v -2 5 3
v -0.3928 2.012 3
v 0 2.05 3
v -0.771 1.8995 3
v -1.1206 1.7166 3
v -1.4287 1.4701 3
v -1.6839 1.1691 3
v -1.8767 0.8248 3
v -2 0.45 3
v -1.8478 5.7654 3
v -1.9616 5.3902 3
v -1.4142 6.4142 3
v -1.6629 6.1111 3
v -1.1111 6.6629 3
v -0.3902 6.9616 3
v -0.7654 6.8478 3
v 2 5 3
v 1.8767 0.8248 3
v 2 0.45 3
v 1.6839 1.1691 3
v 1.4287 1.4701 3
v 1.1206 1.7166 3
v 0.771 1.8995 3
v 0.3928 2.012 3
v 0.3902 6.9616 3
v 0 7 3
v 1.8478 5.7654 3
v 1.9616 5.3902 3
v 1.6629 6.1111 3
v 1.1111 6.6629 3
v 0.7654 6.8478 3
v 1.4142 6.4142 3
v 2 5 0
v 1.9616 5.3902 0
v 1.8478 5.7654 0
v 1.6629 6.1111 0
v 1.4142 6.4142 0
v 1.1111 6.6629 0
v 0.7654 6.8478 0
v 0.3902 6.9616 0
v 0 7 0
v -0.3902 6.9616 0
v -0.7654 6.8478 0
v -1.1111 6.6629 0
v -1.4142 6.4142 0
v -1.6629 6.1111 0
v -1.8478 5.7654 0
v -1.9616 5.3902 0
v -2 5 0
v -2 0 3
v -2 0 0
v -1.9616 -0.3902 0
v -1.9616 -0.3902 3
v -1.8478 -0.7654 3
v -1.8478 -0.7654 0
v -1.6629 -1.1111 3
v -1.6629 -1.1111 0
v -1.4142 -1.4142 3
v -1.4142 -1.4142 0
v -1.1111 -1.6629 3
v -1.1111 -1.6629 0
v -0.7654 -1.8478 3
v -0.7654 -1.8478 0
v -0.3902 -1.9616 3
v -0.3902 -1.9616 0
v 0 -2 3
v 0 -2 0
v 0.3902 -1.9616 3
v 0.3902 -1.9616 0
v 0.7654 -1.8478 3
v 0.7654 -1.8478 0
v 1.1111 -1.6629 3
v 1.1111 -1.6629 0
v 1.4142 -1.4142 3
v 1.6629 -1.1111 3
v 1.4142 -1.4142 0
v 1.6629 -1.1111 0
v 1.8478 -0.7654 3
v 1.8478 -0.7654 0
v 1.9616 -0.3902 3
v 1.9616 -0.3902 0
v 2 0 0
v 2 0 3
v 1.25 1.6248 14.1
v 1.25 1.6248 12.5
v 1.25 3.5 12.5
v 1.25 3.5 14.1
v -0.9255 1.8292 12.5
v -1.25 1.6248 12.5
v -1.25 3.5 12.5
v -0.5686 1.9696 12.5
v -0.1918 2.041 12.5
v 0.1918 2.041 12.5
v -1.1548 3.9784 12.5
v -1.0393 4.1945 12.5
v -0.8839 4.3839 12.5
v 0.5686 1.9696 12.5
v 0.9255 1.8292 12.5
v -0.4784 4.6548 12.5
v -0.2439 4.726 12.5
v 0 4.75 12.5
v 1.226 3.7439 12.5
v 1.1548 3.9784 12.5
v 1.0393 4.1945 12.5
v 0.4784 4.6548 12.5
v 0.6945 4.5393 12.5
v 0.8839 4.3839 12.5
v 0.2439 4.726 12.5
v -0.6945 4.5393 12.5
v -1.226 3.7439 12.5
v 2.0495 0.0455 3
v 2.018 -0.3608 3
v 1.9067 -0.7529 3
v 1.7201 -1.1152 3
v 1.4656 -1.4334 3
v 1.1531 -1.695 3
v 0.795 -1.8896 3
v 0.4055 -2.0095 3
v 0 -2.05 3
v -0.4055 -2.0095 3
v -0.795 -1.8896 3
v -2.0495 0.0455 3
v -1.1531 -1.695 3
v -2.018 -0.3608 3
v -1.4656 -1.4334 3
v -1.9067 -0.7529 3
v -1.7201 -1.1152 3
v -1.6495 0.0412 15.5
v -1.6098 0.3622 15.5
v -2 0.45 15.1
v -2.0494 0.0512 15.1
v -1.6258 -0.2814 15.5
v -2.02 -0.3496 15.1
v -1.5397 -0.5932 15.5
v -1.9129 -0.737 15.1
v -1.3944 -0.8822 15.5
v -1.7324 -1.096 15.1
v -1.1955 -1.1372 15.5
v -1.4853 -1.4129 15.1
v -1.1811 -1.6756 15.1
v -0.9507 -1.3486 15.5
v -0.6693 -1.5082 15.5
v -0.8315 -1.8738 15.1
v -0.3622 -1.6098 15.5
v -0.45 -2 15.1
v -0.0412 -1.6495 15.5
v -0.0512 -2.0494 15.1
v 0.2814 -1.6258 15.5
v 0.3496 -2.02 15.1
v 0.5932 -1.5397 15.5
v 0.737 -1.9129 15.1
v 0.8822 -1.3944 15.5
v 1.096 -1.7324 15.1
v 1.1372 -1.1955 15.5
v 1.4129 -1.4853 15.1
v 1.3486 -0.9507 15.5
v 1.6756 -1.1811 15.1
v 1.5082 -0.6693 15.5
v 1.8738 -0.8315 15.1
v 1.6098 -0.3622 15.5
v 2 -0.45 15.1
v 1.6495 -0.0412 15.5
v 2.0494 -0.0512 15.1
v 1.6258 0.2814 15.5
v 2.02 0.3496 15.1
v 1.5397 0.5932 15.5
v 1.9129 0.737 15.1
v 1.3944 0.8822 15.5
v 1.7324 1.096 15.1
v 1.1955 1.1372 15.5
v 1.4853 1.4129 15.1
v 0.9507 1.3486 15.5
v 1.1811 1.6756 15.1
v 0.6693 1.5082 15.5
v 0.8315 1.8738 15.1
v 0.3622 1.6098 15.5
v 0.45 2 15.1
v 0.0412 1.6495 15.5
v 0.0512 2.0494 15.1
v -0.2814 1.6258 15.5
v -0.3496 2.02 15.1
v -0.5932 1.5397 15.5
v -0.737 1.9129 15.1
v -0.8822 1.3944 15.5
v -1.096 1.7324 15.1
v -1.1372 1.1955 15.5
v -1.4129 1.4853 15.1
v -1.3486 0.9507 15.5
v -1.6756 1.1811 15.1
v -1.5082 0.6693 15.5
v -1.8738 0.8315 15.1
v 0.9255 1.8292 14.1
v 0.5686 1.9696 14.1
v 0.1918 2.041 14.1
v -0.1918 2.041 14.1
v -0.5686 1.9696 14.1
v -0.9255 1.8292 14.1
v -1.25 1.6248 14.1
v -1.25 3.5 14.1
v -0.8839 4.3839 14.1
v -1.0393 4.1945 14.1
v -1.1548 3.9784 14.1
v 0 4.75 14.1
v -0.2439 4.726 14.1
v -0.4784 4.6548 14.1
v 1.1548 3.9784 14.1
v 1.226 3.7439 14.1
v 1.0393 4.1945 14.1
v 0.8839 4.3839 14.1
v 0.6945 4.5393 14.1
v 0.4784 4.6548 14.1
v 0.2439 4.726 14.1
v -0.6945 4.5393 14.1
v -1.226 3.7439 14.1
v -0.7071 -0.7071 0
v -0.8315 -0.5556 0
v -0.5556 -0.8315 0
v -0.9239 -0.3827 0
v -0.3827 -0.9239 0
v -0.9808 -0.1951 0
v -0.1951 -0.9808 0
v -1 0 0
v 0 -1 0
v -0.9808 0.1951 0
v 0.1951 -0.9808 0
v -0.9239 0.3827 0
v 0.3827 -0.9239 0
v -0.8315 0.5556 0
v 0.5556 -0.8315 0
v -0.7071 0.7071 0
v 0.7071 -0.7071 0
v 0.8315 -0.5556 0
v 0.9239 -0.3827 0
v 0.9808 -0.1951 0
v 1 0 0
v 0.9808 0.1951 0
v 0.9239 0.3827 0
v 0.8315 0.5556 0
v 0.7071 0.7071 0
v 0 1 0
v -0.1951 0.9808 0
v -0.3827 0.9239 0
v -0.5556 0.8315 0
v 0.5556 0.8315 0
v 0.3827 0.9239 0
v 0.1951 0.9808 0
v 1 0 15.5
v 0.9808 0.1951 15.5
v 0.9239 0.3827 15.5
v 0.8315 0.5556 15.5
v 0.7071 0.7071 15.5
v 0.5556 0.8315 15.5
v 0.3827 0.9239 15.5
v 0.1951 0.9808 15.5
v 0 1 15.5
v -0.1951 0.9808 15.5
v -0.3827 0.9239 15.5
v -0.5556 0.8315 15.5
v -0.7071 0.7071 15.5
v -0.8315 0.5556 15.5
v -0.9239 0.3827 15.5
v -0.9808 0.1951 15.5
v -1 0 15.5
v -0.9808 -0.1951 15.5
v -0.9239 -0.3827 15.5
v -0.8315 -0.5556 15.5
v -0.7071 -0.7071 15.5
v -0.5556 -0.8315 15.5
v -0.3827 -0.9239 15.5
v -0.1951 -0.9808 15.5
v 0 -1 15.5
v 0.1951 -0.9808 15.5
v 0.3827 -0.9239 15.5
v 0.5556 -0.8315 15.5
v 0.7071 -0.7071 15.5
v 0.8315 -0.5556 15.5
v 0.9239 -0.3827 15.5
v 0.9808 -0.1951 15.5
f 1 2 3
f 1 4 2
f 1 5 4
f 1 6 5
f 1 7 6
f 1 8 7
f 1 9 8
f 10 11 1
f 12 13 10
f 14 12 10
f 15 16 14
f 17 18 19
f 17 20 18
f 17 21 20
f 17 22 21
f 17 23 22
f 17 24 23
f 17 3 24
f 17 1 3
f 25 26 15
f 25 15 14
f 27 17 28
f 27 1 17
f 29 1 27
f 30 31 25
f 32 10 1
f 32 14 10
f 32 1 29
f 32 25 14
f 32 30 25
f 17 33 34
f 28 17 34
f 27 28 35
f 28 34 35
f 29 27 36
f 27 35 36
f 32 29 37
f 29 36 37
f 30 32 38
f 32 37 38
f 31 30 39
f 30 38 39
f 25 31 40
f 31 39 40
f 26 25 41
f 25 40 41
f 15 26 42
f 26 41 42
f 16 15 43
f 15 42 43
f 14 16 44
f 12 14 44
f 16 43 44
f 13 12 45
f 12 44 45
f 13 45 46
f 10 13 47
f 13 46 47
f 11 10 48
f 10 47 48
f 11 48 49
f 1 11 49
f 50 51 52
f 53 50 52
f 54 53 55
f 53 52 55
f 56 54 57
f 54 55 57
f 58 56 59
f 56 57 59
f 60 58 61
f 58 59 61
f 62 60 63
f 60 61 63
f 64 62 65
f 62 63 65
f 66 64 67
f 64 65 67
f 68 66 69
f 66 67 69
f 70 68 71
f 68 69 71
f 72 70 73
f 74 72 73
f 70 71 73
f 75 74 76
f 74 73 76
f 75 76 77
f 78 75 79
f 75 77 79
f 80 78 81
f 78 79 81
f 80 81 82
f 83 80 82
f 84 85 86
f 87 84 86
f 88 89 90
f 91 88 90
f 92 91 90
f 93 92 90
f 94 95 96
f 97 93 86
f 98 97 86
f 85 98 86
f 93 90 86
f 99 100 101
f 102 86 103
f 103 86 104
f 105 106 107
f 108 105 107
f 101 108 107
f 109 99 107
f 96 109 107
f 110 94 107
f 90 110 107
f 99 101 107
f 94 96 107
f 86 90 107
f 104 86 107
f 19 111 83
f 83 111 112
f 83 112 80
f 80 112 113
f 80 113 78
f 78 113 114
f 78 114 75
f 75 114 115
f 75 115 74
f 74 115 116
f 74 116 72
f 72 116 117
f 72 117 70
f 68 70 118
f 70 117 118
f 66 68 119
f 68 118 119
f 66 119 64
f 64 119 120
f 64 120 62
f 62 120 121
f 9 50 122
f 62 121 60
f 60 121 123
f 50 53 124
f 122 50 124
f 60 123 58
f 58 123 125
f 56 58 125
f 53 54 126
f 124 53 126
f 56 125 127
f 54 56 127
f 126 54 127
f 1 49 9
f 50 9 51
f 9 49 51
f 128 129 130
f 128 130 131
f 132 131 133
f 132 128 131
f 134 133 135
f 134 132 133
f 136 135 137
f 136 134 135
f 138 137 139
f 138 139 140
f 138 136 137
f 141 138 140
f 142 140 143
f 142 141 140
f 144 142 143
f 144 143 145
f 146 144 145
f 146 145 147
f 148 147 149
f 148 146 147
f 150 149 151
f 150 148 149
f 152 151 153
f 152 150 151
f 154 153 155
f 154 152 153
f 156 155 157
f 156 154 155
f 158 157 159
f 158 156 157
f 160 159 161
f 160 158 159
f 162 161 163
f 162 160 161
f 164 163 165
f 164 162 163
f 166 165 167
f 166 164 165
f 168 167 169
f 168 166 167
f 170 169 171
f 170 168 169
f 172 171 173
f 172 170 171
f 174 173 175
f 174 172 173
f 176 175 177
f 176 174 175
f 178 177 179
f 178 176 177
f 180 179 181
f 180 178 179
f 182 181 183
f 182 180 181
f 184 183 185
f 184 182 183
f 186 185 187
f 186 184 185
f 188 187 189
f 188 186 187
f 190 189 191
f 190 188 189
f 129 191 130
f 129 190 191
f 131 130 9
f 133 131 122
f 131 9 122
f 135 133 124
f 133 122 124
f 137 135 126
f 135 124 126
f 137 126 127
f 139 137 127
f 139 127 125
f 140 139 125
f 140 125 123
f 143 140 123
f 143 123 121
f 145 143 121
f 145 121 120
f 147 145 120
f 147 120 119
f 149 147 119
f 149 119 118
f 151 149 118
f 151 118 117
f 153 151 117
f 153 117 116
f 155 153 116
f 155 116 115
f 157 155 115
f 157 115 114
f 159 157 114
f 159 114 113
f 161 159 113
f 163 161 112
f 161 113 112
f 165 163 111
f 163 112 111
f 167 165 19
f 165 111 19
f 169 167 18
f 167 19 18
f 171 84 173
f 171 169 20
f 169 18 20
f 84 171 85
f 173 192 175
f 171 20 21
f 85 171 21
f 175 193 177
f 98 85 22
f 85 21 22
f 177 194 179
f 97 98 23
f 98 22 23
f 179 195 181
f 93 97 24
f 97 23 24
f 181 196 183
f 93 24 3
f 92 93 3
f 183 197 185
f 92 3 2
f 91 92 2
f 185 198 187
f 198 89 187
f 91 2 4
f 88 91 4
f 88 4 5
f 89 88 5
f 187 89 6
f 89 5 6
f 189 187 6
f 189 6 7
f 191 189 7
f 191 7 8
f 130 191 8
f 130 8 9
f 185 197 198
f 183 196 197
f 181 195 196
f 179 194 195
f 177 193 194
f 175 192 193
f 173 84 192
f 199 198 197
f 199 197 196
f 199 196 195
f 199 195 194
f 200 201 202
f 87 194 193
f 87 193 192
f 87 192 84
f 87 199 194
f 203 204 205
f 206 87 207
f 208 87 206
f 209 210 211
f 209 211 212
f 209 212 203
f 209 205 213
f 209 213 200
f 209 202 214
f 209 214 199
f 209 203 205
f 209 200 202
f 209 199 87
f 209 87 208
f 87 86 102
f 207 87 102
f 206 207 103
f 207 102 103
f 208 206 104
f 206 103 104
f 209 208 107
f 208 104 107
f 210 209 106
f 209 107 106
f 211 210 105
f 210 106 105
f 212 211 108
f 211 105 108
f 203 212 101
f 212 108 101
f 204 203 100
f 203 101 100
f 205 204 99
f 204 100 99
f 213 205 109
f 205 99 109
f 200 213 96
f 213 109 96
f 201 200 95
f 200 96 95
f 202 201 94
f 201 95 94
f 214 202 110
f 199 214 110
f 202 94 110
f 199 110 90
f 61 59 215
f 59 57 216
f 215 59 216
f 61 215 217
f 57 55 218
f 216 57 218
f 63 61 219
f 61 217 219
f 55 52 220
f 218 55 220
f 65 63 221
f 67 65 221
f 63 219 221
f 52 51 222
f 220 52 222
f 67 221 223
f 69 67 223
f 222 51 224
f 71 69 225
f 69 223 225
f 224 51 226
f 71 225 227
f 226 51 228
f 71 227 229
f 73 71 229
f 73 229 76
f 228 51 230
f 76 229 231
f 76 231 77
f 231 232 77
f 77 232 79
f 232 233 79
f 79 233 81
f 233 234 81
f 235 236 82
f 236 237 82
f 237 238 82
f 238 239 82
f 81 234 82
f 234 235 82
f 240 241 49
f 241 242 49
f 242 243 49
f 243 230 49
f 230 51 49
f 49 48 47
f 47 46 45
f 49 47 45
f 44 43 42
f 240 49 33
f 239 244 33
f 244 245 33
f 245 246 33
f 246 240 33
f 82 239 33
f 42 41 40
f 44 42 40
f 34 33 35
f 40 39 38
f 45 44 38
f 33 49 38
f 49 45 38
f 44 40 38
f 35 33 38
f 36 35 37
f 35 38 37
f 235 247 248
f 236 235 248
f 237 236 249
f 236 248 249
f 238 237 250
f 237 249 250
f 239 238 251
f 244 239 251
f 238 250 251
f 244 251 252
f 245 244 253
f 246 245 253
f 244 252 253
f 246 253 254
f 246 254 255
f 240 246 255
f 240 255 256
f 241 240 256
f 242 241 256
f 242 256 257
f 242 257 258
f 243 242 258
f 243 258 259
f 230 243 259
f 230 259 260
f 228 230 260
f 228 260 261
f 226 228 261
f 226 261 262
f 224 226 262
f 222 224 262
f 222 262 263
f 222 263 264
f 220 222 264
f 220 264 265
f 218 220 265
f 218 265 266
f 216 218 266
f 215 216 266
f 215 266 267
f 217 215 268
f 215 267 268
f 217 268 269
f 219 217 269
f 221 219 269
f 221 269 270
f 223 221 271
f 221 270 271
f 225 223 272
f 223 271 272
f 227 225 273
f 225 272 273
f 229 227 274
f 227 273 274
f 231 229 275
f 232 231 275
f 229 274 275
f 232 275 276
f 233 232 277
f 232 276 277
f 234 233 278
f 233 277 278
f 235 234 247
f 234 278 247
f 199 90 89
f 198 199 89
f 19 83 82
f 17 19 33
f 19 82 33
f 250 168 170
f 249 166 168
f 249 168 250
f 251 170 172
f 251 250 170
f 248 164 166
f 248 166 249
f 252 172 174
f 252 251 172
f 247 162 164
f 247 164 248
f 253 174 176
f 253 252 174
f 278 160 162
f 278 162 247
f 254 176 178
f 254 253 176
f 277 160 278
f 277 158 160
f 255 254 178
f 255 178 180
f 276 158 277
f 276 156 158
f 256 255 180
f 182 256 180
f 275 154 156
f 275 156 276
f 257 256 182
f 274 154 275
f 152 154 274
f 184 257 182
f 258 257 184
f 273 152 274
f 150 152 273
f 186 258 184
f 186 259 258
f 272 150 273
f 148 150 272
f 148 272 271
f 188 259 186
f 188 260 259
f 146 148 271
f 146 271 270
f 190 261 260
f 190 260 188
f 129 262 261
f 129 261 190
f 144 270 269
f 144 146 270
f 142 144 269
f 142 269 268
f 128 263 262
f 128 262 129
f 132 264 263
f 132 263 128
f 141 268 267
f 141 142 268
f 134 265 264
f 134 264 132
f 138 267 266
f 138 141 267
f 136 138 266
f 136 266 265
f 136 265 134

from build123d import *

# Parameters (mm, degrees)
AUFSATZ_LINEAR_AUSTRAGEN1_DEPTH = 3
SKIZZE2_R                       = 2.05
AUFSATZ_LINEAR_AUSTRAGEN2_DEPTH = 12.5
AUFSATZ_LINEAR_START            = 9.5
AUFSATZ_LINEAR_AUSTRAGEN3_DEPTH = 1.6
SCHNITT_LINEAR_AUSTRAGEN1_REACH = 19.13
SKIZZE4_R                       = 1
FASE1_SIZE                      = 0.4


with BuildPart() as part:
    # Skizze1 → Aufsatz-Linear austragen1 (new body)
    with BuildSketch(Plane.XY):
        with BuildLine():
            Line((2, 0), (2, 5))
            ThreePointArc((2, 5), (0, 7), (-2, 5))
            Line((-2, 5), (-2, 0))
            ThreePointArc((-2, 0), (0, -2), (2, 0))
        make_face()
    extrude(amount=AUFSATZ_LINEAR_AUSTRAGEN1_DEPTH)

    # Skizze2 → Aufsatz-Linear austragen2 (add)
    with BuildSketch(Plane.XY.offset(3)):
        with Locations(Location((0, 0, 0), (0, 0, 167.319616508))):
            Circle(SKIZZE2_R)
    extrude(amount=AUFSATZ_LINEAR_AUSTRAGEN2_DEPTH)

    # Skizze3 → Aufsatz-Linear austragen3 (add)
    with BuildSketch(Plane.XY.offset(3).offset(AUFSATZ_LINEAR_START)):
        with BuildLine():
            Line((-1.25, 3.5), (-1.25, 1.624807681))
            ThreePointArc((-1.25, 1.624807681), (0, 2.05), (1.25, 1.624807681))
            Line((1.25, 1.624807681), (1.25, 3.5))
            ThreePointArc((1.25, 3.5), (0, 4.75), (-1.25, 3.5))
        make_face()
    extrude(amount=AUFSATZ_LINEAR_AUSTRAGEN3_DEPTH)

    # Skizze4 → Schnitt-Linear austragen1 (cut, up to next)
    with BuildSketch(Plane.XY.offset(15.5), mode=Mode.PRIVATE) as schnitt_linear_austragen1_sk1:
        Circle(SKIZZE4_R)
    schnitt_linear_austragen1_tool1 = extrude(schnitt_linear_austragen1_sk1.sketch, amount=-SCHNITT_LINEAR_AUSTRAGEN1_REACH, mode=Mode.PRIVATE) & part.part
    add(schnitt_linear_austragen1_tool1.solids().sort_by_distance((0, 0, 15.5))[0], mode=Mode.SUBTRACT)

    # Fase1
    fase1_edges = [part.edges().sort_by_distance(p)[0] for p in [
        (2, -0.45, 15.5),
    ]]
    chamfer(fase1_edges, length=FASE1_SIZE)


solid = part.part
